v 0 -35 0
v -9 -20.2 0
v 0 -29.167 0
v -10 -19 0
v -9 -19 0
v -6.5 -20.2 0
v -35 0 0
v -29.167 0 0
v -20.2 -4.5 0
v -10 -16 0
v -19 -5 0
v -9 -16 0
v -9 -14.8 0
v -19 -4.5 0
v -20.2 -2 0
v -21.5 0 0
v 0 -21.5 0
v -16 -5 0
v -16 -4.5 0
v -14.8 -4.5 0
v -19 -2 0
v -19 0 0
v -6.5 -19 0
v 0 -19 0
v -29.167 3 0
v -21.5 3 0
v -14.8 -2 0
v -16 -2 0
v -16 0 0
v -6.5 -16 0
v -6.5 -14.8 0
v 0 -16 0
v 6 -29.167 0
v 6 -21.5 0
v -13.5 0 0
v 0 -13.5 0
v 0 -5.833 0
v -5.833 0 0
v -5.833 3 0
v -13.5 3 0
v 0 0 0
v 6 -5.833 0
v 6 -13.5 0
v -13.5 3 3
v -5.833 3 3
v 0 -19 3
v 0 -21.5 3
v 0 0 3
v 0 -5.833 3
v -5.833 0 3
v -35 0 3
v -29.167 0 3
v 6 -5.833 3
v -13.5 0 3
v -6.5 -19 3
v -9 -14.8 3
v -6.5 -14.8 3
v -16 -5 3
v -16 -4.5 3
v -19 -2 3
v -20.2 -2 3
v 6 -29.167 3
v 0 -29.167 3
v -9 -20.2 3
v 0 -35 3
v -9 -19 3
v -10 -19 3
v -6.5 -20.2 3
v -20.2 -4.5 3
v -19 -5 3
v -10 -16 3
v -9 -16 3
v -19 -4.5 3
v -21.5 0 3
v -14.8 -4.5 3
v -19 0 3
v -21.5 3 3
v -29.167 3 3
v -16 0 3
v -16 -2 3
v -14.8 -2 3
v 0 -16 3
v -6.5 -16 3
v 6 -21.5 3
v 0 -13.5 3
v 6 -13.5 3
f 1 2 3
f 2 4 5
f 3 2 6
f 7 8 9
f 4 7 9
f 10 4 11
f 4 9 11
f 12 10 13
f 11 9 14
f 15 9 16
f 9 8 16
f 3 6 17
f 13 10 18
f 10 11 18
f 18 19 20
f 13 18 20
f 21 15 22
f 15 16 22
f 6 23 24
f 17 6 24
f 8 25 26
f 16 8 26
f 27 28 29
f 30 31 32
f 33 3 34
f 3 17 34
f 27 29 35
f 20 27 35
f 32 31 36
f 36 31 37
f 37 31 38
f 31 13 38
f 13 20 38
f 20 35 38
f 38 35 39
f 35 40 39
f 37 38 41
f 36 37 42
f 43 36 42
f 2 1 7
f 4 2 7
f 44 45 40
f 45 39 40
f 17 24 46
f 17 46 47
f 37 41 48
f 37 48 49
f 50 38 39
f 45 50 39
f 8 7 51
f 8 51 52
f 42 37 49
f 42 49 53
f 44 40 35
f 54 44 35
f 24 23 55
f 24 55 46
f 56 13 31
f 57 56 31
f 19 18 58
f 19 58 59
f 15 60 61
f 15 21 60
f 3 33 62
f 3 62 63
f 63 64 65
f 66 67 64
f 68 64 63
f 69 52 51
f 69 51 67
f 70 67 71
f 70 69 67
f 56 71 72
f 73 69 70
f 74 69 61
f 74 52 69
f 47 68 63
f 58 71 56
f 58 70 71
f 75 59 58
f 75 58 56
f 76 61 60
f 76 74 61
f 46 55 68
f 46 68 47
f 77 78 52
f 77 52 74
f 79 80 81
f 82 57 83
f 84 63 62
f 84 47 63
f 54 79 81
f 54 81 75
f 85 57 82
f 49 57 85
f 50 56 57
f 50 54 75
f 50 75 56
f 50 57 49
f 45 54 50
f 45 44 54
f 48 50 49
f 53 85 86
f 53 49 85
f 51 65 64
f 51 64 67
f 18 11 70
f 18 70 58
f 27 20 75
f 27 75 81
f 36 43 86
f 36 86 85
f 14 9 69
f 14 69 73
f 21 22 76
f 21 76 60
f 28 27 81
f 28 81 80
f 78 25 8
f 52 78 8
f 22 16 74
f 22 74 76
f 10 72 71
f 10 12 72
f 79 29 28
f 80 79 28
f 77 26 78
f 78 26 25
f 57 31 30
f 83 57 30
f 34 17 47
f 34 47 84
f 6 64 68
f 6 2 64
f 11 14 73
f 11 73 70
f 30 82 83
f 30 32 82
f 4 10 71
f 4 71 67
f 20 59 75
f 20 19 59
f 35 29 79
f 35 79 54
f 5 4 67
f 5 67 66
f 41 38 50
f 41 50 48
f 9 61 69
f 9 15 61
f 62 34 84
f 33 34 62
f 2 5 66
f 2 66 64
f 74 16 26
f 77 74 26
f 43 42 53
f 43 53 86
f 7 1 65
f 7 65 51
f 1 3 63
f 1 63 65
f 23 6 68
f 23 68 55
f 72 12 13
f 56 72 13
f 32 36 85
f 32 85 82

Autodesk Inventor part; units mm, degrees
ref_plane "YZ Plane" through (0, 0, 0) normal (1, 0, 0) x (0, 1, 0)
ref_plane "XZ Plane" through (0, 0, 0) normal (0, 1, 0) x (-1, 0, 0)
ref_plane "XY Plane" through (0, 0, 0) normal (0, 0, 1) x (1, 0, 0)
sketch "Sketch2" plane through (0, 0, 0) normal (0, 0, 1) x (1, 0, 0)
  line L0 (0, 0) -> (0, -5.8333)
  line L1 (0, -35) -> (-35, 0)
  line L2 (-35, 0) -> (-29.1667, 0)
  line L3 (-5.8333, 0) -> (-5.8333, 3)
  line L4 (-5.8333, 3) -> (-13.5, 3)
  line L5 (-13.5, 3) -> (-13.5, 0)
  line L6 (-21.5, 0) -> (-21.5, 3)
  line L7 (-21.5, 3) -> (-29.1667, 3)
  line L8 (-29.1667, 3) -> (-29.1667, 0)
  line L9 (-17.5, 7.0256) -> (-17.5, -7.5618) construction
  line L10 (-19, 0) -> (-19, -2)
  line L11 (-19, -2) -> (-20.2, -2)
  line L12 (-20.2, -2) -> (-20.2, -4.5)
  line L13 (-20.2, -4.5) -> (-19, -4.5)
  line L14 (-19, -4.5) -> (-19, -5)
  line L15 (-19, -5) -> (-16, -5)
  line L16 (-16, -5) -> (-16, -4.5)
  line L17 (-16, -4.5) -> (-14.8, -4.5)
  line L18 (-14.8, -4.5) -> (-14.8, -2)
  line L19 (-14.8, -2) -> (-16, -2)
  line L20 (-16, 0) -> (-16, -2)
  line L21 (-16, 0) -> (-13.5, 0)
  line L22 (-21.5, 0) -> (-19, 0)
  line L23 (-5.8333, 0) -> (0, 0)
  line L24 (0, -5.8333) -> (6, -5.8333)
  line L25 (6, -5.8333) -> (6, -13.5)
  line L26 (6, -13.5) -> (0, -13.5)
  line L27 (0, -21.5) -> (6, -21.5)
  line L28 (6, -21.5) -> (6, -29.1667)
  line L29 (6, -29.1667) -> (0, -29.1667)
  line L30 (0, -16) -> (-6.5, -16)
  line L31 (-9, -16) -> (-10, -16)
  line L32 (-10, -16) -> (-10, -19)
  line L33 (-10, -19) -> (-9, -19)
  line L34 (-9, -19) -> (-9, -20.2)
  line L35 (-9, -20.2) -> (-6.5, -20.2)
  line L36 (-6.5, -20.2) -> (-6.5, -19)
  line L37 (-6.5, -19) -> (0, -19)
  line L38 (-12.8614, -17.5) -> (7.6104, -17.5) construction
  line L39 (-9, -16) -> (-9, -14.8)
  line L40 (-9, -14.8) -> (-6.5, -14.8)
  line L41 (-6.5, -14.8) -> (-6.5, -16)
  line L42 (0, -13.5) -> (0, -16)
  line L43 (0, -19) -> (0, -21.5)
  line L44 (0, -29.1667) -> (0, -35)
  dimension "d2" = 35
  dimension "d5" = 3
  dimension "d6" = 3
  dimension "d7" = 5
  dimension "d8" = 8
  dimension "d9" = 2.5
  dimension "d10" = 5.4
  dimension "d11" = 8
  dimension "d12" = 23.3333
  dimension "d13" = 35
  dimension "d14" = 6
  dimension "d15" = 3
  dimension "d17" = 16
  dimension "d18" = 2.5
  dimension "d19" = 5.4
  dimension "d20" = 1
  dimension "d21" = 8
  dimension "d22" = 23.3333
extrude "Extrusion1" add sketch "Sketch2" along normal blind 3
equation "\"d12\" = 0.666667 * d2"
equation "\"d13\" = d2"
equation "\"d22\" = 0.666667 * d13"
properties part number "angle"
